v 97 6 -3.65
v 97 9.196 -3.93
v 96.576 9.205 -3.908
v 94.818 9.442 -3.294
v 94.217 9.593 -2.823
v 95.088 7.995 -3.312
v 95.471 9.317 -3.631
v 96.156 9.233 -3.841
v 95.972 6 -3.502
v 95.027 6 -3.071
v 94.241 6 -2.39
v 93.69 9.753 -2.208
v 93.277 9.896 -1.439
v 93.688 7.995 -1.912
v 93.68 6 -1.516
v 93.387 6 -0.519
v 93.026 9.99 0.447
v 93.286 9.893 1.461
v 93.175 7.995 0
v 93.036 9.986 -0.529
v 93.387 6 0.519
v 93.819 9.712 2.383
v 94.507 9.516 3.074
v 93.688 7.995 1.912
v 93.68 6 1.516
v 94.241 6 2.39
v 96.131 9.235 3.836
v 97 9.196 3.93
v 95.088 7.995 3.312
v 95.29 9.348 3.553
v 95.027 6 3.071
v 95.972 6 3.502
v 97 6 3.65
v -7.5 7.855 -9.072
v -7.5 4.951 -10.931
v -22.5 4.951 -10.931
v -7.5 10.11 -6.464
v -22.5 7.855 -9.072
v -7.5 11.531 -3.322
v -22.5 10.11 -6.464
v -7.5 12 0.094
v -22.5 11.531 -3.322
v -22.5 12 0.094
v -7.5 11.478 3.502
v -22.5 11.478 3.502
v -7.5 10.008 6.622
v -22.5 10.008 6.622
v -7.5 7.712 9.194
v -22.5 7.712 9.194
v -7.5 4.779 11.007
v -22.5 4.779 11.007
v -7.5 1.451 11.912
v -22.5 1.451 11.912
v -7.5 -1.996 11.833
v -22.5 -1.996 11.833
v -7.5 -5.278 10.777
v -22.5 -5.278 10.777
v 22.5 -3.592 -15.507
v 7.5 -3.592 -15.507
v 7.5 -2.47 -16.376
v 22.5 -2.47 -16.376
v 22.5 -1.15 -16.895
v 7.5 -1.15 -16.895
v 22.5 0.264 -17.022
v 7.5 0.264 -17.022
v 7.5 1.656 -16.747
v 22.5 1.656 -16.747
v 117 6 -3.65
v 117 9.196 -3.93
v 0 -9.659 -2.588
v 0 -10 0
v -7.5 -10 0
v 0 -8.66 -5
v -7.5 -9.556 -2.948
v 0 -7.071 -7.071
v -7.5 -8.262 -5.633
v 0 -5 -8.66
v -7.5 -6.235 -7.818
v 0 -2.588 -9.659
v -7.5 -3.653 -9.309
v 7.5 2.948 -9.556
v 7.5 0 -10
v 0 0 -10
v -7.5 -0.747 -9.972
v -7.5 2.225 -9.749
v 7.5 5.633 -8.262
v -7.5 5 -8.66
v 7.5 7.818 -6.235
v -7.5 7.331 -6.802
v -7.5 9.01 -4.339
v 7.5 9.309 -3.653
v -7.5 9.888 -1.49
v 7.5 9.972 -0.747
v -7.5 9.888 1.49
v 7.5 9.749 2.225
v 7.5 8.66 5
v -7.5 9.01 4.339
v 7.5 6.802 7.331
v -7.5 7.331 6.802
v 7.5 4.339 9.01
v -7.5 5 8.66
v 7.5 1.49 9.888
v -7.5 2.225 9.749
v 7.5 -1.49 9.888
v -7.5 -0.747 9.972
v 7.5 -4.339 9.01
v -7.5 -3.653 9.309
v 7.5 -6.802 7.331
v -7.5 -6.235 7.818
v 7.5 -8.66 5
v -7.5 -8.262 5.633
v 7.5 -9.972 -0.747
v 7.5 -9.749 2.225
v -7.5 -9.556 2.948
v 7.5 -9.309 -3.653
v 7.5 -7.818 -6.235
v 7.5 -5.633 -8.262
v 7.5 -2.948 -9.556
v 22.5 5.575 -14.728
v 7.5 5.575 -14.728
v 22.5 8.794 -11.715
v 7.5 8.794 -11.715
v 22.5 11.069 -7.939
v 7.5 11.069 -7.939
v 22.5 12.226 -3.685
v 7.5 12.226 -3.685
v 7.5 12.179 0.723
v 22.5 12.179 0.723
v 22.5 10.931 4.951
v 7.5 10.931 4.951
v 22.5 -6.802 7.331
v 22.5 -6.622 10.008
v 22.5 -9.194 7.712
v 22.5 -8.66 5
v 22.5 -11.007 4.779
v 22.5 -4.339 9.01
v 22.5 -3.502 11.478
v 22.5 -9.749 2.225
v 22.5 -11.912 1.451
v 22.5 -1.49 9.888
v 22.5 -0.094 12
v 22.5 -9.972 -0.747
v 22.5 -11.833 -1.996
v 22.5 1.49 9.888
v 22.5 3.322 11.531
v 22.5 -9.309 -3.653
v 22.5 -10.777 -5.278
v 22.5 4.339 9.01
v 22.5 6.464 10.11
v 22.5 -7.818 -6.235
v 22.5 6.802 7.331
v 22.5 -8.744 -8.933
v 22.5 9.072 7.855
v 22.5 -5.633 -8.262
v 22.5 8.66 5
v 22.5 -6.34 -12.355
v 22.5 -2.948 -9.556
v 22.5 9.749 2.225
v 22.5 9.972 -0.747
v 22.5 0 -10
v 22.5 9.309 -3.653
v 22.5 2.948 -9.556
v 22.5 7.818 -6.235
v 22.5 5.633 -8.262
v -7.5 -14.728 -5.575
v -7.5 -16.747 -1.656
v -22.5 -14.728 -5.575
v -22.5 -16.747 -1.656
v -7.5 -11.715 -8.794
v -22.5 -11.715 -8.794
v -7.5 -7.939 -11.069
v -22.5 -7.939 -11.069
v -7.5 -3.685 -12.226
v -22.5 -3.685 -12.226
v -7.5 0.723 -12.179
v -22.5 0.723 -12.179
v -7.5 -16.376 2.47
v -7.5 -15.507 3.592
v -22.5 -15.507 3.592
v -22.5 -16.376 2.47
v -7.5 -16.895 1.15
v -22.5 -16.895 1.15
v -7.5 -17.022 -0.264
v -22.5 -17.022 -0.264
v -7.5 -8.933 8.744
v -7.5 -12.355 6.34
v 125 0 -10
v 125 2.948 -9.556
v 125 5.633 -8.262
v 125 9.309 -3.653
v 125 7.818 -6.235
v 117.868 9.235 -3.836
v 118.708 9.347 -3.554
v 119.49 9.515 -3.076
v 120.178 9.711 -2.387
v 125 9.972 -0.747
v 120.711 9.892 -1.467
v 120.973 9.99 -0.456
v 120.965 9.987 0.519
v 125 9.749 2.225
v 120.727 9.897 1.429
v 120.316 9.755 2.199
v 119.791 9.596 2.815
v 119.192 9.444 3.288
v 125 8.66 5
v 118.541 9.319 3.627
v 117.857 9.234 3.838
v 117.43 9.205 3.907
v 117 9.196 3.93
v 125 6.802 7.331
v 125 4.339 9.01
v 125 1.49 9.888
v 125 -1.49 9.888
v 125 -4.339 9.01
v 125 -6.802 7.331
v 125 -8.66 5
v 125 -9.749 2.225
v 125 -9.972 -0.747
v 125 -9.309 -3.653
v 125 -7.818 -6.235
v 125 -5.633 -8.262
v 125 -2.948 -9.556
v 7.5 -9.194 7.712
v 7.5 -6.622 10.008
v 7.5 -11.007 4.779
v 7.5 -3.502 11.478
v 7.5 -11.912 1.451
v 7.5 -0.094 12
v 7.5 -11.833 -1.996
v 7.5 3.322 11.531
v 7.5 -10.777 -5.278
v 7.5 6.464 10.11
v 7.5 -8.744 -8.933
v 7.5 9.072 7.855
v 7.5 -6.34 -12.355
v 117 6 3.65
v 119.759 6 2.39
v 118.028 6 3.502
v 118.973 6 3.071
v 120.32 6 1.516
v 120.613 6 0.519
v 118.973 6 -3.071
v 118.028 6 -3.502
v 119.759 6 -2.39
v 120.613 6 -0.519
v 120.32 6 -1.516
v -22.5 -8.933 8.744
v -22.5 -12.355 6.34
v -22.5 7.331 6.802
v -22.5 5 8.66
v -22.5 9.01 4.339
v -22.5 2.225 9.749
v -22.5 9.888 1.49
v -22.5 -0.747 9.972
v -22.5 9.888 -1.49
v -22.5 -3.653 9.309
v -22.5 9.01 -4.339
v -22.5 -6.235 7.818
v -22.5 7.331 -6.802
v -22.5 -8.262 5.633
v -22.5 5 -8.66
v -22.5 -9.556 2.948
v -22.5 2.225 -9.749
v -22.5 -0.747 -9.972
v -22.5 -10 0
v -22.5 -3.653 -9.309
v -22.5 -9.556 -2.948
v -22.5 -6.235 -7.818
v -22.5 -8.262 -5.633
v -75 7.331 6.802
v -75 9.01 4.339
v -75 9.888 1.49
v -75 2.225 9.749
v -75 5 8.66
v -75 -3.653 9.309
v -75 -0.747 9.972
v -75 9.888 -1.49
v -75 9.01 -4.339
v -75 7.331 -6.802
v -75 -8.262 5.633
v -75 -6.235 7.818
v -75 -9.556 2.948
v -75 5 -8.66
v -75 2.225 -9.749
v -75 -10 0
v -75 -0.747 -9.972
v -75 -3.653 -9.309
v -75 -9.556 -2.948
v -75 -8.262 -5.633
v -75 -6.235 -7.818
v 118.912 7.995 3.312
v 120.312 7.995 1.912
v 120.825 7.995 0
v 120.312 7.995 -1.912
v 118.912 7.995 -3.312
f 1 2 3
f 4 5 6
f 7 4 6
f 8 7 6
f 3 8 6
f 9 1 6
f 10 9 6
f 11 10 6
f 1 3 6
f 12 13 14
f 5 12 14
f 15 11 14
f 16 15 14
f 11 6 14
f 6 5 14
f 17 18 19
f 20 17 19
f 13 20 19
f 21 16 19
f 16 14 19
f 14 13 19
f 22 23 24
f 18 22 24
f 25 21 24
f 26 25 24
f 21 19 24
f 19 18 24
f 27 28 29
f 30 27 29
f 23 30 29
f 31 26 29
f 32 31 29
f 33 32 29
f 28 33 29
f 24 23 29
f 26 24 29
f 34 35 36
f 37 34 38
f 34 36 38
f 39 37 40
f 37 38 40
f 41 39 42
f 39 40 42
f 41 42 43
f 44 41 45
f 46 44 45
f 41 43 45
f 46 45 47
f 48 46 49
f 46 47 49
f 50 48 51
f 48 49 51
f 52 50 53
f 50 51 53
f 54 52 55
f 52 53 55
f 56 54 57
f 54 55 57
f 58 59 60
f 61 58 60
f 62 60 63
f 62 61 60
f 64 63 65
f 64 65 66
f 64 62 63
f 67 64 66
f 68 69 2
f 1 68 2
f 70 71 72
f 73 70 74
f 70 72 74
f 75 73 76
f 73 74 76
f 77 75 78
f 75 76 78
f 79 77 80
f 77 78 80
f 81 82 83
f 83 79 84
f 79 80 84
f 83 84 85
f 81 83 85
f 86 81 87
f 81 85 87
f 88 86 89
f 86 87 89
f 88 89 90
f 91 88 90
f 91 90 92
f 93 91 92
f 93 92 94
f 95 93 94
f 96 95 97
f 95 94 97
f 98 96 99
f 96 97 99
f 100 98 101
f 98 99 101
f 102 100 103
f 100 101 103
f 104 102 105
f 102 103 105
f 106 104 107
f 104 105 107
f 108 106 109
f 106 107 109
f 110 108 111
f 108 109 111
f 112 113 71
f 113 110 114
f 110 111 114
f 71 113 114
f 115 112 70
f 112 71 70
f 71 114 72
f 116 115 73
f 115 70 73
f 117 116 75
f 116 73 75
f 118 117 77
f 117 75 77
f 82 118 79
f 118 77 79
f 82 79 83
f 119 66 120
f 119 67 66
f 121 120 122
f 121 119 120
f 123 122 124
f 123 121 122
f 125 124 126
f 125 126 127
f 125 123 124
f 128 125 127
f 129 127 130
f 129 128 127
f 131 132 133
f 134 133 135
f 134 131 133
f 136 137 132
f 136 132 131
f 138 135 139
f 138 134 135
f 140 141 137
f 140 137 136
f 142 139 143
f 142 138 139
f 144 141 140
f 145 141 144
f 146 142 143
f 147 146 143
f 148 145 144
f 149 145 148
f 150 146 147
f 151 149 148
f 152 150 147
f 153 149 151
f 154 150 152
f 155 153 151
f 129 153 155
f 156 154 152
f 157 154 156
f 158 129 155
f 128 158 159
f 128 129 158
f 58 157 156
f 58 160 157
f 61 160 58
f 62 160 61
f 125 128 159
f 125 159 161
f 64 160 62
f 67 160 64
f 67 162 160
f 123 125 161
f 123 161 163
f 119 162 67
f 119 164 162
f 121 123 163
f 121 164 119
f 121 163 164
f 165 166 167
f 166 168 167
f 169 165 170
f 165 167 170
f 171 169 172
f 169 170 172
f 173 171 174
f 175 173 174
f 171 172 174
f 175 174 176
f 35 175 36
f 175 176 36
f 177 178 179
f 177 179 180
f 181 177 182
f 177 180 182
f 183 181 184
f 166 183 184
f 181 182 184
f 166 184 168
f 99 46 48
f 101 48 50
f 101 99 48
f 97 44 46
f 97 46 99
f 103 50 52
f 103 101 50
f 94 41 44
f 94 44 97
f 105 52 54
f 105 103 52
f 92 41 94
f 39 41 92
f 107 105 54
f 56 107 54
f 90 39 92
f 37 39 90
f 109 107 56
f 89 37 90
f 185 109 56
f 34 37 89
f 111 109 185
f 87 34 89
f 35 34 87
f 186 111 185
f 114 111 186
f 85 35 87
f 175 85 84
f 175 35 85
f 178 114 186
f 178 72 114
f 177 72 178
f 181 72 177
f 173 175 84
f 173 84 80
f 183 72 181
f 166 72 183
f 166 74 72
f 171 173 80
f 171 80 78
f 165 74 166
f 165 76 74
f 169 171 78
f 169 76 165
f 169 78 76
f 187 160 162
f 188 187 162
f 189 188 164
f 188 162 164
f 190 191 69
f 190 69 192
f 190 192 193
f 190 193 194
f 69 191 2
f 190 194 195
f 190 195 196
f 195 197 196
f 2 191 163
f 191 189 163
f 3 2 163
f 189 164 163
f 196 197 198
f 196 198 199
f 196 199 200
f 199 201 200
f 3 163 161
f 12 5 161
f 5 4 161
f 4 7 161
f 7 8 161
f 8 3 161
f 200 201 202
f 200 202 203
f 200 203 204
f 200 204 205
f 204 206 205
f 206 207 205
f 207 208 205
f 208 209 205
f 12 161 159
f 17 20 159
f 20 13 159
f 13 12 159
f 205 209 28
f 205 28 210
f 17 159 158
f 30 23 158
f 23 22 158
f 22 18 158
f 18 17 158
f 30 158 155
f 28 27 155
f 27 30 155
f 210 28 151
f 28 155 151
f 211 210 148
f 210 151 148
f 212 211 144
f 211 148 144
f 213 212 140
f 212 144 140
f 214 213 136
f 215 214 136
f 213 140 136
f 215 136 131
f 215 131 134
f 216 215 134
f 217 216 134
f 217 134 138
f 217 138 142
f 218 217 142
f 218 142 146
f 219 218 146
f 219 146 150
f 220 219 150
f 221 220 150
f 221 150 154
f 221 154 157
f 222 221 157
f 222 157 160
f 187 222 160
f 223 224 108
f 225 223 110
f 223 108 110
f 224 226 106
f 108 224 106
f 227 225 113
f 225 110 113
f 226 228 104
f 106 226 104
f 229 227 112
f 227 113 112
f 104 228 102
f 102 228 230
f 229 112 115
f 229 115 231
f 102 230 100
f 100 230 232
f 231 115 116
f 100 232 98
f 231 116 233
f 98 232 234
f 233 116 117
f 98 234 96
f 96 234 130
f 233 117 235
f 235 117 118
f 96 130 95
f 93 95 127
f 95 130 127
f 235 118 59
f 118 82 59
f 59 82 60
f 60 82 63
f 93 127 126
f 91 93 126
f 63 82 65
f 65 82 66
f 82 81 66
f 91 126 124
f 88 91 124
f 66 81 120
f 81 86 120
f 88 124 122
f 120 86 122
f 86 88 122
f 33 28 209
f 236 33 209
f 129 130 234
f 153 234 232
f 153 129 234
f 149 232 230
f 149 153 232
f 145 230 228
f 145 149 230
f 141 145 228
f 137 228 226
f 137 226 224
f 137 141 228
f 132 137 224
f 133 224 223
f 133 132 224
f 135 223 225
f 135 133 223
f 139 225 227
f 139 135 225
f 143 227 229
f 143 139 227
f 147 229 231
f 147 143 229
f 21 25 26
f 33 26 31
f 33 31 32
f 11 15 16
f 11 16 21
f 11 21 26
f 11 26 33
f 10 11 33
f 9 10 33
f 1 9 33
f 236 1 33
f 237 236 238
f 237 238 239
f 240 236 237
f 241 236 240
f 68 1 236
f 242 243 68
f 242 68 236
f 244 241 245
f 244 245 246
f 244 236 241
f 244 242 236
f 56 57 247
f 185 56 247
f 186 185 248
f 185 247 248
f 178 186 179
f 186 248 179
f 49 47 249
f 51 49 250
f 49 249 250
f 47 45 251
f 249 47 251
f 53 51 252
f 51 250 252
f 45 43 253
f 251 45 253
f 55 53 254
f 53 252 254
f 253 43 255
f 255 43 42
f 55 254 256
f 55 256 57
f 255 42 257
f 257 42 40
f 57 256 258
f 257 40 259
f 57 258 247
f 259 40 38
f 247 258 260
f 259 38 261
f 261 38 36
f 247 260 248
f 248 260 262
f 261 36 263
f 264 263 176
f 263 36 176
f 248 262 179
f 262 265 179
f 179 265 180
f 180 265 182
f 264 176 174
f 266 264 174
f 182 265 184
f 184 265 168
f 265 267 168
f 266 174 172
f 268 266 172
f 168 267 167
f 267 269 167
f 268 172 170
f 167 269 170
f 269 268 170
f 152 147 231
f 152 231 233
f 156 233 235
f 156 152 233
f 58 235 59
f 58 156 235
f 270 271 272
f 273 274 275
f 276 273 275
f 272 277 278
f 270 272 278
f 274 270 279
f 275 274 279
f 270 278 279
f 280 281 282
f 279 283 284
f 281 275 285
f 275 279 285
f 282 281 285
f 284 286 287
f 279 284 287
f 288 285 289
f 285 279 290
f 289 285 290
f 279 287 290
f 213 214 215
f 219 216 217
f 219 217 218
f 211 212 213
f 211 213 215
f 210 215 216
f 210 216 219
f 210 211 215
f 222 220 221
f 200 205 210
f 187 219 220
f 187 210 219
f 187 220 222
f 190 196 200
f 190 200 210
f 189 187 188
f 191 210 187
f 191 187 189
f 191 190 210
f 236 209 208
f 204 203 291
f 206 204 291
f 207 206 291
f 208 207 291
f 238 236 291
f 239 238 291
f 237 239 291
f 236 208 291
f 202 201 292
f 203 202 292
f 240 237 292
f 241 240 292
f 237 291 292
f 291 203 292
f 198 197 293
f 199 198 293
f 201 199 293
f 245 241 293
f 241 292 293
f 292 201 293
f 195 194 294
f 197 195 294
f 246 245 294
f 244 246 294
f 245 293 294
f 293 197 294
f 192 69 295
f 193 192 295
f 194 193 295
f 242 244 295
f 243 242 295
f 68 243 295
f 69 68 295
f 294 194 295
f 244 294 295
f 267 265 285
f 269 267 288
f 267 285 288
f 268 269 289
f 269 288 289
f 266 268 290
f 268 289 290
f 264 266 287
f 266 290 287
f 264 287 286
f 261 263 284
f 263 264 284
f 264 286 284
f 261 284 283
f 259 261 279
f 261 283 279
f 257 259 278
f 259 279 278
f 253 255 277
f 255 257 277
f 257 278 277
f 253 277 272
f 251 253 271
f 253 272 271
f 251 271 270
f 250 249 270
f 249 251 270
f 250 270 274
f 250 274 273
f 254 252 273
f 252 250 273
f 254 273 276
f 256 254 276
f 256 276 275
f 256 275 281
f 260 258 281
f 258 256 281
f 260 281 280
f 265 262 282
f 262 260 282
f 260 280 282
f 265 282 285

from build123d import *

# Parameters (mm, degrees)
BOSS_EXTRUDE1_DEPTH      = 125
BOSS_EXTRUDE1_DEPTH_BACK = 75
SKETCH1_R                = 10
BOSS_EXTRUDE2_START      = 15
BOSS_EXTRUDE2_DEPTH      = 7.5
BODY_MOVE_COPY4_ANGLE    = 90
CUT_EXTRUDE1_START       = 10
CUT_EXTRUDE1_DEPTH       = 4
CUT_EXTRUDE1_DRAFT       = -5


with BuildPart() as part:
    # Sketch1 → Boss-Extrude1 (new, two sides: drawn at the far end of the back side and taken through both)
    with BuildSketch(Plane(origin=(0, 0, 0), x_dir=(0, 0, -1), z_dir=(1, 0, 0)).offset(-BOSS_EXTRUDE1_DEPTH_BACK)):
        Circle(SKETCH1_R)
    extrude(amount=BOSS_EXTRUDE1_DEPTH + BOSS_EXTRUDE1_DEPTH_BACK)

    # Sketch2 → Boss-Extrude2 (add, symmetric)
    with BuildSketch(Plane(origin=(0, 0, 0), x_dir=(0, 0, -1), z_dir=(1, 0, 0)).offset(BOSS_EXTRUDE2_START)):
        with BuildLine():
            ThreePointArc((-4.950818385, 10.931120589), (-10.855235073, -5.115063196), (5.27814522, -10.776881879))
            ThreePointArc((5.27814522, -10.776881879), (10.675009162, -7.586625818), (15.507108825, -3.59229396))
            ThreePointArc((15.507108825, -3.59229396), (16.895326586, -1.149524968), (16.746983201, 1.656230392))
            ThreePointArc((16.746983201, 1.656230392), (7.939134659, 11.068540296), (-4.950818385, 10.931120589))
        make_face()
    boss_extrude2 = extrude(amount=BOSS_EXTRUDE2_DEPTH, both=True)

    # Mirror3: Boss-Extrude2 across plane
    add(boss_extrude2.mirror(Plane(origin=(0, 0, 0), x_dir=(0, 0, 1), z_dir=(1, 0, 0))))


with BuildPart() as body_2:
    # Split1: the piece on the far side of the plane
    add(part.part)
    split(bisect_by=Plane(origin=(0, 0, 0), x_dir=(0, 0, 1), z_dir=(1, 0, 0)), keep=Keep.BOTTOM)


with BuildPart() as part_1:
    add(part.part)

    # Split1
    split(bisect_by=Plane(origin=(0, 0, 0), x_dir=(0, 0, 1), z_dir=(1, 0, 0)), keep=Keep.TOP)


with BuildPart() as body_2_1:
    # Body-Move/Copy4: moved
    add(body_2.part.rotate(Axis((0, 0, 0), (-1, 0, 0)), BODY_MOVE_COPY4_ANGLE))

    # Combine1: union part
    add(part_1.part)


with BuildPart() as cut_extrude1_tool:
    # Sketch5 → Cut-Extrude1 (with draft: the straight prism first)
    with BuildSketch(Plane(origin=(0, 0, 0), x_dir=(1, 0, 0), z_dir=(0, 1, 0)).offset(CUT_EXTRUDE1_START)):
        with BuildLine():
            ThreePointArc((97, 4), (93, 0), (97, -4))
            Line((97, -4), (117, -4))
            ThreePointArc((117, -4), (121, 0), (117, 4))
            Line((117, 4), (97, 4))
        make_face()
    extrude(amount=-CUT_EXTRUDE1_DEPTH)
    # Cut-Extrude1: the draft: its side faces are tilted about the plane it starts from
    cut_extrude1_sides = [cut_extrude1_tool.faces().sort_by_distance(p)[0] for p in [
        (121, 8, 0),
        (107, 8, -4),
        (93, 8, 0),
        (107, 8, 4),
    ]]
    draft(cut_extrude1_sides, Plane(origin=(0, 0, 0), x_dir=(1, 0, 0), z_dir=(0, 1, 0)).offset(CUT_EXTRUDE1_START), CUT_EXTRUDE1_DRAFT)


with BuildPart() as body_2_2:
    add(body_2_1.part)

    # Cut-Extrude1: cut by cut_extrude1_tool
    add(cut_extrude1_tool.part, mode=Mode.SUBTRACT)


solid = body_2_2.part
